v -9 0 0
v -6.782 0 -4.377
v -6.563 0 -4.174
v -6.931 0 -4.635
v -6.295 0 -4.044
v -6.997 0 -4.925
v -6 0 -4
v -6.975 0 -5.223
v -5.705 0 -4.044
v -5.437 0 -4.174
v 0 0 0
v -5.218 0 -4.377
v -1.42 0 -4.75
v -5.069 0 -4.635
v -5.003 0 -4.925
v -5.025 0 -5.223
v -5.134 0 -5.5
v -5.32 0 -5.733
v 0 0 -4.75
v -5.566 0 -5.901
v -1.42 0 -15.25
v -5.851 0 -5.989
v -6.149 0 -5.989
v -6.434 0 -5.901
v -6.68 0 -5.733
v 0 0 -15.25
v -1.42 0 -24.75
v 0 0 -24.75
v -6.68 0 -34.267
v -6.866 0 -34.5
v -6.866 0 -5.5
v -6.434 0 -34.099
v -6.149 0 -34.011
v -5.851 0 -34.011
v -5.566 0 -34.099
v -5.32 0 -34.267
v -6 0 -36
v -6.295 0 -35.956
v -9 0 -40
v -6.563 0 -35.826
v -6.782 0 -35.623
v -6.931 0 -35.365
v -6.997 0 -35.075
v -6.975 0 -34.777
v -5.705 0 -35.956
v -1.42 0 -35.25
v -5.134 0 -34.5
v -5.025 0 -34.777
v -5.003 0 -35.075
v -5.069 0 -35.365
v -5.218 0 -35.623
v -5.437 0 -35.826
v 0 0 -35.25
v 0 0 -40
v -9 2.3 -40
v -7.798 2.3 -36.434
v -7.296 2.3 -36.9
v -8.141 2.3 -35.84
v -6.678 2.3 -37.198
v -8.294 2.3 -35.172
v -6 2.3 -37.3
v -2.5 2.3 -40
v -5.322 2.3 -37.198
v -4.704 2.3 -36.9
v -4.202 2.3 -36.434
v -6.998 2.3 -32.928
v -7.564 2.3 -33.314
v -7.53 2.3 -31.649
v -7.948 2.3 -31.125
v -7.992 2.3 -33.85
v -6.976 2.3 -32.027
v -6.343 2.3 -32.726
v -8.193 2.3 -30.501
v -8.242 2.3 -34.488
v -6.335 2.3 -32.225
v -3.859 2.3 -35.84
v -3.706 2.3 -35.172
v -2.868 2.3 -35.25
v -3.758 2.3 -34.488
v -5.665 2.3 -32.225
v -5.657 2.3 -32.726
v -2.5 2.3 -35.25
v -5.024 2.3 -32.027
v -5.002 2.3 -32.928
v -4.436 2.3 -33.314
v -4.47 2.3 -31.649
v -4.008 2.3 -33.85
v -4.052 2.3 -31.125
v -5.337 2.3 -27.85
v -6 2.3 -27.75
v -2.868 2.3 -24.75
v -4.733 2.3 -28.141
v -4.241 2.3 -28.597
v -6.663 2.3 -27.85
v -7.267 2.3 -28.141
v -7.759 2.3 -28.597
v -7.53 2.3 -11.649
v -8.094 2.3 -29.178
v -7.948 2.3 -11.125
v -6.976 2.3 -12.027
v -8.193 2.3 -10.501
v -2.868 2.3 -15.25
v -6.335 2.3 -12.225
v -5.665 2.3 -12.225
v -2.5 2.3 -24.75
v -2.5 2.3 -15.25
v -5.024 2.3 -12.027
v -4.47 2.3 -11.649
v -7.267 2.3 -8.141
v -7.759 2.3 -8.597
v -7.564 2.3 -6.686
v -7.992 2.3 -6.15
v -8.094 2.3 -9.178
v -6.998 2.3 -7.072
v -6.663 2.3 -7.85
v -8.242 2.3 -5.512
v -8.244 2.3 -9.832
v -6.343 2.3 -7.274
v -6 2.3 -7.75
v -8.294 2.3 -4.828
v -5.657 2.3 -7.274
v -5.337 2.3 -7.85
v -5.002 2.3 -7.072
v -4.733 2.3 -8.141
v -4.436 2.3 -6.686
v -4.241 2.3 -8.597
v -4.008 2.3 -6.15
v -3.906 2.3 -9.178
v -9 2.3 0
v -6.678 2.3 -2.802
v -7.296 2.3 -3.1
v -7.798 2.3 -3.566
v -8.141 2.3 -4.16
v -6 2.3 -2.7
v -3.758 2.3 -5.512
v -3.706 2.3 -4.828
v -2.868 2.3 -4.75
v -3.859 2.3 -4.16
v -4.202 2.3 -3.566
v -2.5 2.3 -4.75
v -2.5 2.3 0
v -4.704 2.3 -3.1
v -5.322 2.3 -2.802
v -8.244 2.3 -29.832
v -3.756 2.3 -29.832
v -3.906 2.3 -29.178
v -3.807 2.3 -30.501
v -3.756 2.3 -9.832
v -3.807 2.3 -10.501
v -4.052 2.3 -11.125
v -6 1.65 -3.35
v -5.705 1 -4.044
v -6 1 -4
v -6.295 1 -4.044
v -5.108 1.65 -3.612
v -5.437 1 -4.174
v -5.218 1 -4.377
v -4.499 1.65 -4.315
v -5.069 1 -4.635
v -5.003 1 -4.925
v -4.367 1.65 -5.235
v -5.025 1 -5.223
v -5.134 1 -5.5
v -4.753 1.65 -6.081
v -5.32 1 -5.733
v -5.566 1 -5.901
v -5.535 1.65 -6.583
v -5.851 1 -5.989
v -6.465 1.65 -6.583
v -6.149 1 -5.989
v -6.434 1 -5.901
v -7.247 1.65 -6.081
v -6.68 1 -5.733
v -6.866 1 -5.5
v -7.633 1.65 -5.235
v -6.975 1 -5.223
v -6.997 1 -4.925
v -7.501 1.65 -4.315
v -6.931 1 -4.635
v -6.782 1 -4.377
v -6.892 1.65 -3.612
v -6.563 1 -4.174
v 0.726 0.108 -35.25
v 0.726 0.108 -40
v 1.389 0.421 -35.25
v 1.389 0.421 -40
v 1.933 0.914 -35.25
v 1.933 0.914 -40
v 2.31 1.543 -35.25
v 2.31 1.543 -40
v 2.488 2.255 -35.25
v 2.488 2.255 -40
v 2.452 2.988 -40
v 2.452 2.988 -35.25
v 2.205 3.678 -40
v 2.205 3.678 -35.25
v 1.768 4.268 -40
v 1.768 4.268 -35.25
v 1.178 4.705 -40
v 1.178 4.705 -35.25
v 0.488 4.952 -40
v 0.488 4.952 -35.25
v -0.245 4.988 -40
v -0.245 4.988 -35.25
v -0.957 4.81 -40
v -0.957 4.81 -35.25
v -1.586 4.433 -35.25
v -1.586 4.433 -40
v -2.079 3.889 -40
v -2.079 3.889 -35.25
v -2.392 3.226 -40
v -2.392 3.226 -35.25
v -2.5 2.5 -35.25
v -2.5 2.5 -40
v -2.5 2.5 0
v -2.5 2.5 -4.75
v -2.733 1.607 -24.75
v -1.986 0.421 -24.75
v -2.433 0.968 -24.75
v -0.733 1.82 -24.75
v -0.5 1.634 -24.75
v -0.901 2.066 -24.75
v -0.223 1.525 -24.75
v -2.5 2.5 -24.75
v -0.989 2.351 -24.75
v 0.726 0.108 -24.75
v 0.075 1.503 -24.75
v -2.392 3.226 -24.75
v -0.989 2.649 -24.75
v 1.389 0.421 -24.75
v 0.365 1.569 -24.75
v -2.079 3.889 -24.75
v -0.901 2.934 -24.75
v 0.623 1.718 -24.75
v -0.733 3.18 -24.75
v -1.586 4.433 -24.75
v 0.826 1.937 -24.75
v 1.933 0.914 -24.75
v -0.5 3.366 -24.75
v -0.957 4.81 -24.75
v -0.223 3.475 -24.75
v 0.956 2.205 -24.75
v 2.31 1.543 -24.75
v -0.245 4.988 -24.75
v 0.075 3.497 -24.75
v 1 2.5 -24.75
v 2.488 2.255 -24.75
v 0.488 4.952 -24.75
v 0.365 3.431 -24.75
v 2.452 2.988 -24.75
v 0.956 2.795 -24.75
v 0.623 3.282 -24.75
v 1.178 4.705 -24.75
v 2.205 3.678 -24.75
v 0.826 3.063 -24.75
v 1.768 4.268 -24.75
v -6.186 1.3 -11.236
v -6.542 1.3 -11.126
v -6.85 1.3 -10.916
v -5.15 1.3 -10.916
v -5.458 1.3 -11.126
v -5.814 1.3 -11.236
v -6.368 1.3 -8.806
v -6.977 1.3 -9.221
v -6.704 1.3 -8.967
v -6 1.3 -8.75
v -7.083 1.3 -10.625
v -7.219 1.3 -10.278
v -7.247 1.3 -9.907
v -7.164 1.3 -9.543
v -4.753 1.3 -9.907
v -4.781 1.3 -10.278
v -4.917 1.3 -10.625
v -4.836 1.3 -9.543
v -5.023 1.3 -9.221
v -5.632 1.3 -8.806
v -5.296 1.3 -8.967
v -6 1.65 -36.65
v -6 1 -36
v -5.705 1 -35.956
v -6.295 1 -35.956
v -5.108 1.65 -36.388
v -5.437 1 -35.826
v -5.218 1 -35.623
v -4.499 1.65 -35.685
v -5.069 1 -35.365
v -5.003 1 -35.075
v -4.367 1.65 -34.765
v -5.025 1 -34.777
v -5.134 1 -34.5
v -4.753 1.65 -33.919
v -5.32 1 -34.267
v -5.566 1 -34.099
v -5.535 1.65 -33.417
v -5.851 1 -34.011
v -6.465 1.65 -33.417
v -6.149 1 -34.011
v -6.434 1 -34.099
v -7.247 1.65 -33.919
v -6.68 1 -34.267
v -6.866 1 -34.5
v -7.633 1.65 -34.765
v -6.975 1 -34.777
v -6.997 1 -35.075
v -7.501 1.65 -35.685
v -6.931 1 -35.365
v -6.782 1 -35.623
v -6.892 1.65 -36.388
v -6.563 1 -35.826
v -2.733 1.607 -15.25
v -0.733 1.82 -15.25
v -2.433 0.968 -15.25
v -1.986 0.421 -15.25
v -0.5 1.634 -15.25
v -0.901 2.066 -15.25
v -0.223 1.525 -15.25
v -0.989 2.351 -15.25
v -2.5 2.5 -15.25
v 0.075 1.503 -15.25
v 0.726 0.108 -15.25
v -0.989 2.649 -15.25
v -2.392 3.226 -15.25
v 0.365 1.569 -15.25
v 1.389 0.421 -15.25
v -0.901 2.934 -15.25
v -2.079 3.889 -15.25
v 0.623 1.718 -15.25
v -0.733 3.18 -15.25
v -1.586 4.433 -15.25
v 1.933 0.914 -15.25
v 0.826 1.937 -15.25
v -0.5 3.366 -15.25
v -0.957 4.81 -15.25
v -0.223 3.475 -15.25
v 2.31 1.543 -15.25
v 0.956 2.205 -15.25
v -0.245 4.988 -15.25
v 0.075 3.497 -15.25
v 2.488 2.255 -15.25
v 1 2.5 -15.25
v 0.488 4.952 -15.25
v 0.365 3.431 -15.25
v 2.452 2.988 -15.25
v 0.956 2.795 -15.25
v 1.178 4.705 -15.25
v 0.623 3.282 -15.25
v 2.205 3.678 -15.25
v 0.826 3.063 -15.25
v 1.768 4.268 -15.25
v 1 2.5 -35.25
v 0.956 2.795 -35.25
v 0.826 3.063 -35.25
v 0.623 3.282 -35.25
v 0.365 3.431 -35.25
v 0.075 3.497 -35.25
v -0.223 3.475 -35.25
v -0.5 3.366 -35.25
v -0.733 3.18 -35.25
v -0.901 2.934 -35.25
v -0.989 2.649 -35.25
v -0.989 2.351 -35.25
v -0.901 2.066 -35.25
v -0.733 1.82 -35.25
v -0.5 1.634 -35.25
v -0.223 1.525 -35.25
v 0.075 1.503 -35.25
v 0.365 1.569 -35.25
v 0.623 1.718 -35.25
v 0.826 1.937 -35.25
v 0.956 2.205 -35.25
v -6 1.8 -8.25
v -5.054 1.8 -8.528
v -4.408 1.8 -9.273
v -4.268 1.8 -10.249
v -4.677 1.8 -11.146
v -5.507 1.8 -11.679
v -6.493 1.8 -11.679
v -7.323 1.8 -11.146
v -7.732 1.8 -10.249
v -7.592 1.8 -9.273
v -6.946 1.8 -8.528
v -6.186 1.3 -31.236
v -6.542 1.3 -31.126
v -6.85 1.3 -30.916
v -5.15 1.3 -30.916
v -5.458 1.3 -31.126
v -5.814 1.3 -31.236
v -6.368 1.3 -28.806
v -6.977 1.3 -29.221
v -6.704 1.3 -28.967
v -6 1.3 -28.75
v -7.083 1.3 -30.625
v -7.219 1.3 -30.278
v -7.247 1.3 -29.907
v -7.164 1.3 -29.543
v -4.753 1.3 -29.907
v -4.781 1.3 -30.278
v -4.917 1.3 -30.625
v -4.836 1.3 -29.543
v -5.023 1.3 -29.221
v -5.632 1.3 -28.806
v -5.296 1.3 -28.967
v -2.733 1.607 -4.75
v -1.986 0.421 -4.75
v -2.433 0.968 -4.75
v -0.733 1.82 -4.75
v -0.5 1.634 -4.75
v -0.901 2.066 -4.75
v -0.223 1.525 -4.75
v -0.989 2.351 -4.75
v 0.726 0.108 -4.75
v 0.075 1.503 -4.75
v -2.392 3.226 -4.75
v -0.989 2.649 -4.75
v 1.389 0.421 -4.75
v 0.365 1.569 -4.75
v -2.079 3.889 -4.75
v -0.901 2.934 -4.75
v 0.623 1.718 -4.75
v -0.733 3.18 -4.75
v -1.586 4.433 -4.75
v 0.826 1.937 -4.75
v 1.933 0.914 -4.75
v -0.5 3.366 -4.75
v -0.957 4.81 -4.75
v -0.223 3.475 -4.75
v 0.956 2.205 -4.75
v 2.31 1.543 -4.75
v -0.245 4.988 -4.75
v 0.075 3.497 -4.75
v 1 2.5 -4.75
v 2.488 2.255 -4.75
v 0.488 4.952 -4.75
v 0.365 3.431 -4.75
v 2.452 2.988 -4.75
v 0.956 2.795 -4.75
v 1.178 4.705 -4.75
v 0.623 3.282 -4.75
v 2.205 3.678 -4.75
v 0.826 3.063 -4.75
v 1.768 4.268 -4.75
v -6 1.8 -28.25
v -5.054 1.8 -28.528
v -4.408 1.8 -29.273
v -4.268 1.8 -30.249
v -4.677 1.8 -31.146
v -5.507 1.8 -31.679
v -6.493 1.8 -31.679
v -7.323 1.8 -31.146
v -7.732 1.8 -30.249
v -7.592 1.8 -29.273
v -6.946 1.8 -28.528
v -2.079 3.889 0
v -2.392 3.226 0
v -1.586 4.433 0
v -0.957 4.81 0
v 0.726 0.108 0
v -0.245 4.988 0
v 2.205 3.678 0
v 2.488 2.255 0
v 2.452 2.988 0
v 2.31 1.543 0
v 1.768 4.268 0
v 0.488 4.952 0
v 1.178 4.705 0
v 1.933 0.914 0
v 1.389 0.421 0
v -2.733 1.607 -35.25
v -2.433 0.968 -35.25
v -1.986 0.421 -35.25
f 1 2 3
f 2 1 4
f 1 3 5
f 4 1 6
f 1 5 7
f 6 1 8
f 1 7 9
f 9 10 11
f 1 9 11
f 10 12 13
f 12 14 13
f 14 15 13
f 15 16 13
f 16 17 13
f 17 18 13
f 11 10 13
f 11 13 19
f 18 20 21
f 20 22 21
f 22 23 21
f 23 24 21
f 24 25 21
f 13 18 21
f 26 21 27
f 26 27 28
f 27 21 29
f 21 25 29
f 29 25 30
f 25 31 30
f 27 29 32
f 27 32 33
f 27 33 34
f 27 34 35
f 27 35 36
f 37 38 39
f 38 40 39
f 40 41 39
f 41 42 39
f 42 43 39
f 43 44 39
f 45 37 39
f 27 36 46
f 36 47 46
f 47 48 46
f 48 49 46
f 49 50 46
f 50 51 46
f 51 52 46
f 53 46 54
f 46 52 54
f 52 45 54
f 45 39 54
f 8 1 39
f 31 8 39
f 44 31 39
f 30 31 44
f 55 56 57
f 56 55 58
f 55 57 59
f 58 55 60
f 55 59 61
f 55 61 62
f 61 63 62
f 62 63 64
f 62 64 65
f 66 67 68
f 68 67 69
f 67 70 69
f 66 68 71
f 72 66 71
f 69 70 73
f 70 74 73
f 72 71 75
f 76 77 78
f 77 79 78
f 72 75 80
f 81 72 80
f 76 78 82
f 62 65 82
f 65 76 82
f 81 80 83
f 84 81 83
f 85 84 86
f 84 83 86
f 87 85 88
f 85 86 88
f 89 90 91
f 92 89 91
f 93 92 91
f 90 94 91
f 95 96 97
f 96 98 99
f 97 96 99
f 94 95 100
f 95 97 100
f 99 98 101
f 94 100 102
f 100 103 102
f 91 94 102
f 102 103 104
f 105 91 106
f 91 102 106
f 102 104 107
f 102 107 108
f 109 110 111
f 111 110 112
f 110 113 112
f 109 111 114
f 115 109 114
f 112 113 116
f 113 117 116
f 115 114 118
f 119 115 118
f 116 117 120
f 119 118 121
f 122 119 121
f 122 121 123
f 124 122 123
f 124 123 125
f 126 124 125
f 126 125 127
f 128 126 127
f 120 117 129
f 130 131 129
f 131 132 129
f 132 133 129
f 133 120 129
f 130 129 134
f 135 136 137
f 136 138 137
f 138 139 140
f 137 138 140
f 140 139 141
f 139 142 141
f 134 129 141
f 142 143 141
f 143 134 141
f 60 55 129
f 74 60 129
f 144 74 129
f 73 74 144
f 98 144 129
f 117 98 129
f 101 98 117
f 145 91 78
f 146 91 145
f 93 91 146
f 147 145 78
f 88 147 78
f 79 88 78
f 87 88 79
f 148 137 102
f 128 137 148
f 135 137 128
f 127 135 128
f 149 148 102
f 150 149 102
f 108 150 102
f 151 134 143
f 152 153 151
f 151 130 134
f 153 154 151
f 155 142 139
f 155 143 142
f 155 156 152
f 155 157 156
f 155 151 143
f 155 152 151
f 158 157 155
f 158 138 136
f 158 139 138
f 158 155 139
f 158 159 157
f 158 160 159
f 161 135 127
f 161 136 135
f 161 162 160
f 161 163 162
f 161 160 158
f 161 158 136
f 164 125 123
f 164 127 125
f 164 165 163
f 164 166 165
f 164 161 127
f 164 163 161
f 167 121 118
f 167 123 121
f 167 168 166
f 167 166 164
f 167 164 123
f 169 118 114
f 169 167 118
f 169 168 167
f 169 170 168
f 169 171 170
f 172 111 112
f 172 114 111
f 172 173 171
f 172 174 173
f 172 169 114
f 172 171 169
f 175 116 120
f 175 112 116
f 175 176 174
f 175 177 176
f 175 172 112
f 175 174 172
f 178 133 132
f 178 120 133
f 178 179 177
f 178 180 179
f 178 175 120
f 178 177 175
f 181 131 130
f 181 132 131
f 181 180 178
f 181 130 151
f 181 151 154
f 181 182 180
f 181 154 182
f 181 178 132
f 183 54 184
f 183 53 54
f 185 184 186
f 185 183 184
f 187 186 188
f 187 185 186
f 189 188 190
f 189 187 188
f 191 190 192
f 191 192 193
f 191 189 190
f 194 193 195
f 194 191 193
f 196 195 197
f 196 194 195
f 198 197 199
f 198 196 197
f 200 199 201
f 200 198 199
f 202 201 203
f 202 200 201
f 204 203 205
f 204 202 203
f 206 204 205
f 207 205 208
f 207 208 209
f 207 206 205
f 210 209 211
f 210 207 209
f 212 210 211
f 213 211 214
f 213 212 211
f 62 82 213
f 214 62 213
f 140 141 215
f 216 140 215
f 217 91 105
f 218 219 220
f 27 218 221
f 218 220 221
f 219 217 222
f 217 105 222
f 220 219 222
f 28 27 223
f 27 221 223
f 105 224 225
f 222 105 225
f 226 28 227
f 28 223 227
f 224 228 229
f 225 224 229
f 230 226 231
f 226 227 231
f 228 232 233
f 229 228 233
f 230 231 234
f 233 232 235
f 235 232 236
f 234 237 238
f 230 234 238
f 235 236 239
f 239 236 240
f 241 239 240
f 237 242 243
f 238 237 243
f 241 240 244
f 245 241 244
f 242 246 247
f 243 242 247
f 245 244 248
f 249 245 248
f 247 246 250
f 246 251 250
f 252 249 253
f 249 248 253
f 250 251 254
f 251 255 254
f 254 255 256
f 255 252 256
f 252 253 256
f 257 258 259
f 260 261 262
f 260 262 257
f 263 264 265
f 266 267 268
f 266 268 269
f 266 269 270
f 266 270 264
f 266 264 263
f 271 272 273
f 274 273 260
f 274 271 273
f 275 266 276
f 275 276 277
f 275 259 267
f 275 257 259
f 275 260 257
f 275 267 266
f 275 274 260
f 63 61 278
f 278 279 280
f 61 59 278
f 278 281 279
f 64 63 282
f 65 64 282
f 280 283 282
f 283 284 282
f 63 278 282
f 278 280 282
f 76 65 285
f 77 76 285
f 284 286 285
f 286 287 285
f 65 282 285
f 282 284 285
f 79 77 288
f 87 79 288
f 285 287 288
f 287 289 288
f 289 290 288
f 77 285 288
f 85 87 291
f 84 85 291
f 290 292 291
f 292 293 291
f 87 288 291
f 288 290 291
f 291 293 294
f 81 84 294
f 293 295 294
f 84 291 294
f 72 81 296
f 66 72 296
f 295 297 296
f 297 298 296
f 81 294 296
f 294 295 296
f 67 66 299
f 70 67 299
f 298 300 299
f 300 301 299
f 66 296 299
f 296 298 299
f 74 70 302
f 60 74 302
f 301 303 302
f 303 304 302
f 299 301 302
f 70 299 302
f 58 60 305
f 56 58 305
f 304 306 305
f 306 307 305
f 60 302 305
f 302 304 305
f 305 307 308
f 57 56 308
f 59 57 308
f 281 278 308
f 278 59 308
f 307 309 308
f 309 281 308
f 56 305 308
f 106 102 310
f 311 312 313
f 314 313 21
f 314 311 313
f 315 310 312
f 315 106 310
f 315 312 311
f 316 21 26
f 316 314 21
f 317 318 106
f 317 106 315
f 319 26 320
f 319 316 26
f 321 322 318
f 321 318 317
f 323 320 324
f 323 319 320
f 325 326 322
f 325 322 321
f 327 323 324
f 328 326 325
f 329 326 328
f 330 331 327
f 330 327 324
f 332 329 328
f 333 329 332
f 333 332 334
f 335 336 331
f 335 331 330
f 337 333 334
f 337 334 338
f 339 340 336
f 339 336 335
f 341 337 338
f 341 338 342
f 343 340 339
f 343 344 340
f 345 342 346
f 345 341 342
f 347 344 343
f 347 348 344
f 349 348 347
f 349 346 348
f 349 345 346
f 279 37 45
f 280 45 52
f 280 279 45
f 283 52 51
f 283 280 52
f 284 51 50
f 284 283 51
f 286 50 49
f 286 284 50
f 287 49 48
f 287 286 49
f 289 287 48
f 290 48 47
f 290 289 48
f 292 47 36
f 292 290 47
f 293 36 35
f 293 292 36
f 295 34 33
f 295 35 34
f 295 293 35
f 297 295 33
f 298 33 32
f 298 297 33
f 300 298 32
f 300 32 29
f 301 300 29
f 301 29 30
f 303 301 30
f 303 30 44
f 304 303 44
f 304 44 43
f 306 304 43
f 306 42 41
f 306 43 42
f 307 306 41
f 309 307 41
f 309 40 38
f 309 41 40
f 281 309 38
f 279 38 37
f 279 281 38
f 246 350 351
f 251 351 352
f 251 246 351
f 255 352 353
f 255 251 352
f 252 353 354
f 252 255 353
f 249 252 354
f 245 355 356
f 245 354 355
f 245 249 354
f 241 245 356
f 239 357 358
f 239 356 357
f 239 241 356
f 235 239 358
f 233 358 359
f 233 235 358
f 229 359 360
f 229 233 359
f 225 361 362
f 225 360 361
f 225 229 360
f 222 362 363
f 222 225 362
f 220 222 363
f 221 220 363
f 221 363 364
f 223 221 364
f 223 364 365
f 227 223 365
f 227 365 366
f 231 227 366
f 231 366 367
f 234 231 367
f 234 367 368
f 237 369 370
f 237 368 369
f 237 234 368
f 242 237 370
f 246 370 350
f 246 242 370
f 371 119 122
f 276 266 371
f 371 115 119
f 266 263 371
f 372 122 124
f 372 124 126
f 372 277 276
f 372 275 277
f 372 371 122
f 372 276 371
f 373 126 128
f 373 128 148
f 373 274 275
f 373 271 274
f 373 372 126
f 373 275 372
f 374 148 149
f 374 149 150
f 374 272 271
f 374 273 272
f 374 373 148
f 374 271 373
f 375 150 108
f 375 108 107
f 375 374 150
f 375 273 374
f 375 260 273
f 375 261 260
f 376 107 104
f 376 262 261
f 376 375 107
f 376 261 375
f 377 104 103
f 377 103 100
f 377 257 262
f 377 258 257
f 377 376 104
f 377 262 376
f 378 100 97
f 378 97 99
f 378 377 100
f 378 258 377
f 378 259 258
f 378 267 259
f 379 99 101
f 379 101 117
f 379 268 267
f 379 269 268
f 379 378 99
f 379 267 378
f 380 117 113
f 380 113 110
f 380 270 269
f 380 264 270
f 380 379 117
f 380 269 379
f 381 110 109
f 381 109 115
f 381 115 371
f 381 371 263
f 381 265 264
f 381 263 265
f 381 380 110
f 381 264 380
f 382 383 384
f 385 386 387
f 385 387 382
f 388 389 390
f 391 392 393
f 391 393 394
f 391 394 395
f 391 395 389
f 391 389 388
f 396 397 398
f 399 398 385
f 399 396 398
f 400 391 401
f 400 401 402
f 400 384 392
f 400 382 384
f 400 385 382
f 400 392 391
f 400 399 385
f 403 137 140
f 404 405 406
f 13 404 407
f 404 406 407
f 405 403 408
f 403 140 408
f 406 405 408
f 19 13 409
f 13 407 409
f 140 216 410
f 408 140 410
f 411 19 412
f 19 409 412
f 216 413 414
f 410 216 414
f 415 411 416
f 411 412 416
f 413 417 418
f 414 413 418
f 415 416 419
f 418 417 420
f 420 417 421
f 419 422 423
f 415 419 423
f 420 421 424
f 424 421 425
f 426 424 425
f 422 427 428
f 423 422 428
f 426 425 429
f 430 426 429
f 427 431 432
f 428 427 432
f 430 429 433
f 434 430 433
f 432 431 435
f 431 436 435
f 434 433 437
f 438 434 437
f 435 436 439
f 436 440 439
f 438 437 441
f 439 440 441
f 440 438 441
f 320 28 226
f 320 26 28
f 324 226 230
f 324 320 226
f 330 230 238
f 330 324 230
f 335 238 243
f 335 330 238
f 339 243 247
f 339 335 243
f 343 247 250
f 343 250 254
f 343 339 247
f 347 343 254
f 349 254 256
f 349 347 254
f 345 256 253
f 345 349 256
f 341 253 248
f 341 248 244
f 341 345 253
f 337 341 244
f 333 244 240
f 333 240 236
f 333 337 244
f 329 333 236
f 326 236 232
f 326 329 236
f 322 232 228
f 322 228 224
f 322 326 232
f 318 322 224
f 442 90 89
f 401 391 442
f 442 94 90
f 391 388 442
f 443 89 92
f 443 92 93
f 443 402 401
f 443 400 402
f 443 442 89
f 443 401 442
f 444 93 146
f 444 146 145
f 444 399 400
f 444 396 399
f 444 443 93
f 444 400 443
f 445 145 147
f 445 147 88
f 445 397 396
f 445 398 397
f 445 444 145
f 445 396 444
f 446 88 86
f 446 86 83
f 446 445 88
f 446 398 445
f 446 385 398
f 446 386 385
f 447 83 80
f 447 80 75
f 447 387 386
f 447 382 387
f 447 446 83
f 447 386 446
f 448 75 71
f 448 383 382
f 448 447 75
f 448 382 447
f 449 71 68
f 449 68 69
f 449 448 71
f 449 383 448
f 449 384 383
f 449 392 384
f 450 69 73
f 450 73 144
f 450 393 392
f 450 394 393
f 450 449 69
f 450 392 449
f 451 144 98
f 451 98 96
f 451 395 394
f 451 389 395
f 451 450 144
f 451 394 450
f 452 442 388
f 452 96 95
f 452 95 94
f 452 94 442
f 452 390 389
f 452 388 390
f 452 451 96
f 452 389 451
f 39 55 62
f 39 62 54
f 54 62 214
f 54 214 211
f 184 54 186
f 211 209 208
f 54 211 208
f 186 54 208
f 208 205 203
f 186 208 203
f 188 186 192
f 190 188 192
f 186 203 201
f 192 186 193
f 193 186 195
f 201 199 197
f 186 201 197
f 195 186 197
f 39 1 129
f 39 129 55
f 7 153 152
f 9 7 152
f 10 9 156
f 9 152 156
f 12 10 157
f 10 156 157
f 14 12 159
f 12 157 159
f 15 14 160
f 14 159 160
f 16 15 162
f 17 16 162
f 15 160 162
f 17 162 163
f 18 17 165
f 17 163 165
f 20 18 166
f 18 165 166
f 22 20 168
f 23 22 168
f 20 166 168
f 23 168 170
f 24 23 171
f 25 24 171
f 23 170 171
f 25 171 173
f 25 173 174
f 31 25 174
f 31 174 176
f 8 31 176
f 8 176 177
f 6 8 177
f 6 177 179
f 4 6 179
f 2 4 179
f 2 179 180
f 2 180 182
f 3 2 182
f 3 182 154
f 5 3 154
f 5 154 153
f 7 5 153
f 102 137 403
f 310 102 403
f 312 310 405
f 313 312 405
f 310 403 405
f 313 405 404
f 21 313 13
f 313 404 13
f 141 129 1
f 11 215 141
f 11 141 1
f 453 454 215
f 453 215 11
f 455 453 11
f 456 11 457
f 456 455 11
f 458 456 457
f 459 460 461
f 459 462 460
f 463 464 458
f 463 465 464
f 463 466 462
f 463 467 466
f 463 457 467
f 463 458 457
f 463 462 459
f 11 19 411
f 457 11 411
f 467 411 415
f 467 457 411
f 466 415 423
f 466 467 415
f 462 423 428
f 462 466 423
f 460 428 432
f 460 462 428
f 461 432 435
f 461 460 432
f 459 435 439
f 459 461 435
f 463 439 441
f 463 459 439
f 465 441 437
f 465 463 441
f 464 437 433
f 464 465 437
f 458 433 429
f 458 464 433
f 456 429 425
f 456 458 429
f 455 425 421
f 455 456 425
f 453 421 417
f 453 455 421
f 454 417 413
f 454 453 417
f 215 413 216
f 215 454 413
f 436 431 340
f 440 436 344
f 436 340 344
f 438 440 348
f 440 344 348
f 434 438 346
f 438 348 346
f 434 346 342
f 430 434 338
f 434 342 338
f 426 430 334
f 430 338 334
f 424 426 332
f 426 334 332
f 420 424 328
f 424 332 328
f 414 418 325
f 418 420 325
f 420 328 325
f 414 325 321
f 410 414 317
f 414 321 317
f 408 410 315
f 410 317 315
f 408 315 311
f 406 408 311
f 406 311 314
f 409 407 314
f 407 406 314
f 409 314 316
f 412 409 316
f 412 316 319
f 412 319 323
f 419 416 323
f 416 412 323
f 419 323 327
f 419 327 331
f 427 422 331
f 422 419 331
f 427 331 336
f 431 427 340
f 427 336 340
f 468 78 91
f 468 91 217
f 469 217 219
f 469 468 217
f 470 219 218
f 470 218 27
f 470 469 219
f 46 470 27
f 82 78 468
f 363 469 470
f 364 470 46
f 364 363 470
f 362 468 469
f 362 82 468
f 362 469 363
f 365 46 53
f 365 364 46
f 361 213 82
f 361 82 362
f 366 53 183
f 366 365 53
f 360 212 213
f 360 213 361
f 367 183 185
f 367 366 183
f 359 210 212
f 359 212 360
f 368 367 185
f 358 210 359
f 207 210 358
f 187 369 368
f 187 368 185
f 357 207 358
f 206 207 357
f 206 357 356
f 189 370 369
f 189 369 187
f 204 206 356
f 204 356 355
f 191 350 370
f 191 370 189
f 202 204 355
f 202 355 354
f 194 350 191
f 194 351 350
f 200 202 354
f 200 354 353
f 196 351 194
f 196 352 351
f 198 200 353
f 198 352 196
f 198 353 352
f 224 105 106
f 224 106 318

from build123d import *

# Parameters (mm, degrees)
SKETCH1_W           = 9
SKETCH1_H           = 40
BOSS_EXTRUDE1_DEPTH = 2.5
SKETCH2_R           = 2.5
BOSS_EXTRUDE2_DEPTH = 40
CUT_EXTRUDE1_START  = -4.75
SKETCH3_R           = 2.875
CUT_EXTRUDE1_DEPTH  = 10.5
BOSS_EXTRUDE3_REACH = 28.806
SKETCH4_R           = 1
SKETCH5_R           = 1
CUT_EXTRUDE2_DEPTH  = 42.076148797
CHAMFER1_SIZE       = 1.5
CHAMFER2_SIZE       = 1.5
SKETCH6_W           = 6.5
SKETCH6_H           = 0.2
CUT_EXTRUDE3_DEPTH  = 42.303752856
SKETCH7_R           = 1.25
CUT_EXTRUDE4_DEPTH  = 1
CHAMFER3_SIZE       = 1


with BuildPart() as part:
    # Sketch1 → Boss-Extrude1 (new body)
    with BuildSketch(Plane(origin=(0, 0, 0), x_dir=(1, 0, 0), z_dir=(0, 1, 0))):
        with Locations((-4.5, 20)):
            Rectangle(SKETCH1_W, SKETCH1_H)
    extrude(amount=BOSS_EXTRUDE1_DEPTH)

    # Sketch2 → Boss-Extrude2 (add)
    with BuildSketch(Plane.XY):
        with Locations((0, 2.5)):
            Circle(SKETCH2_R)
    extrude(amount=-BOSS_EXTRUDE2_DEPTH)

    # Sketch3 → Cut-Extrude1 (cut)
    with BuildSketch(Plane.XY.offset(CUT_EXTRUDE1_START)):
        with Locations((0, 2.5)):
            Circle(SKETCH3_R)
    cut_extrude1 = extrude(amount=-CUT_EXTRUDE1_DEPTH, mode=Mode.SUBTRACT)

    # Mirror1: Cut-Extrude1 across plane
    add(cut_extrude1.mirror(Plane.XY.offset(-20)), mode=Mode.SUBTRACT)

    # Sketch4 → Boss-Extrude3 (add, up to next)
    with BuildSketch(Plane.XY.offset(-15.25), mode=Mode.PRIVATE) as boss_extrude3_sk1:
        with Locations((0, 2.5)):
            Circle(SKETCH4_R)
    boss_extrude3_tool1 = extrude(boss_extrude3_sk1.sketch, amount=BOSS_EXTRUDE3_REACH, mode=Mode.PRIVATE) - part.part
    boss_extrude3 = boss_extrude3_tool1.solids().sort_by_distance((0, 2.5, -15.25))[0]
    add(boss_extrude3)

    # Mirror2: Boss-Extrude3 across plane
    add(boss_extrude3.mirror(Plane.XY.offset(-20)))

    # Sketch5 → Cut-Extrude2 (cut, through all)
    with BuildSketch(Plane(origin=(0, 2.5, 0), x_dir=(1, 0, 0), z_dir=(0, 1, 0))):
        with Locations(Location((-6, 5, 0), (0, 0, 270))):
            Circle(SKETCH5_R)
    cut_extrude2 = extrude(amount=-CUT_EXTRUDE2_DEPTH, mode=Mode.SUBTRACT)

    # Mirror3: Cut-Extrude2 across plane
    add(cut_extrude2.mirror(Plane.XY.offset(-20)), mode=Mode.SUBTRACT)

    # Chamfer1
    chamfer1_edges = [part.edges().sort_by_distance(p)[0] for p in [
        (-6, 2.5, -6),
    ]]
    chamfer(chamfer1_edges, length=CHAMFER1_SIZE)

    # Chamfer2
    chamfer2_edges = [part.edges().sort_by_distance(p)[0] for p in [
        (-6, 2.5, -34),
    ]]
    chamfer(chamfer2_edges, length=CHAMFER2_SIZE)

    # Sketch6 → Cut-Extrude3 (cut, through all)
    with BuildSketch(Plane.XY):
        with Locations((-5.75, 2.4)):
            Rectangle(SKETCH6_W, SKETCH6_H)
    extrude(amount=-CUT_EXTRUDE3_DEPTH, mode=Mode.SUBTRACT)

    # Sketch7 → Cut-Extrude4 (cut)
    with BuildSketch(Plane(origin=(0, 2.3, 0), x_dir=(1, 0, 0), z_dir=(0, 1, 0))):
        with Locations(Location((-6, 30, 0), (0, 0, 270))):
            Circle(SKETCH7_R)
        with Locations(Location((-6, 10, 0), (0, 0, 270))):
            Circle(SKETCH7_R)
    extrude(amount=-CUT_EXTRUDE4_DEPTH, mode=Mode.SUBTRACT)

    # Chamfer3
    chamfer3_edges = [part.edges().sort_by_distance(p)[0] for p in [
        (-6, 2.3, -31.25),
        (-6, 2.3, -11.25),
    ]]
    chamfer(chamfer3_edges, length=CHAMFER3_SIZE - 0.0001)  # a hair under: the kernel refuses the full size


solid = part.part
